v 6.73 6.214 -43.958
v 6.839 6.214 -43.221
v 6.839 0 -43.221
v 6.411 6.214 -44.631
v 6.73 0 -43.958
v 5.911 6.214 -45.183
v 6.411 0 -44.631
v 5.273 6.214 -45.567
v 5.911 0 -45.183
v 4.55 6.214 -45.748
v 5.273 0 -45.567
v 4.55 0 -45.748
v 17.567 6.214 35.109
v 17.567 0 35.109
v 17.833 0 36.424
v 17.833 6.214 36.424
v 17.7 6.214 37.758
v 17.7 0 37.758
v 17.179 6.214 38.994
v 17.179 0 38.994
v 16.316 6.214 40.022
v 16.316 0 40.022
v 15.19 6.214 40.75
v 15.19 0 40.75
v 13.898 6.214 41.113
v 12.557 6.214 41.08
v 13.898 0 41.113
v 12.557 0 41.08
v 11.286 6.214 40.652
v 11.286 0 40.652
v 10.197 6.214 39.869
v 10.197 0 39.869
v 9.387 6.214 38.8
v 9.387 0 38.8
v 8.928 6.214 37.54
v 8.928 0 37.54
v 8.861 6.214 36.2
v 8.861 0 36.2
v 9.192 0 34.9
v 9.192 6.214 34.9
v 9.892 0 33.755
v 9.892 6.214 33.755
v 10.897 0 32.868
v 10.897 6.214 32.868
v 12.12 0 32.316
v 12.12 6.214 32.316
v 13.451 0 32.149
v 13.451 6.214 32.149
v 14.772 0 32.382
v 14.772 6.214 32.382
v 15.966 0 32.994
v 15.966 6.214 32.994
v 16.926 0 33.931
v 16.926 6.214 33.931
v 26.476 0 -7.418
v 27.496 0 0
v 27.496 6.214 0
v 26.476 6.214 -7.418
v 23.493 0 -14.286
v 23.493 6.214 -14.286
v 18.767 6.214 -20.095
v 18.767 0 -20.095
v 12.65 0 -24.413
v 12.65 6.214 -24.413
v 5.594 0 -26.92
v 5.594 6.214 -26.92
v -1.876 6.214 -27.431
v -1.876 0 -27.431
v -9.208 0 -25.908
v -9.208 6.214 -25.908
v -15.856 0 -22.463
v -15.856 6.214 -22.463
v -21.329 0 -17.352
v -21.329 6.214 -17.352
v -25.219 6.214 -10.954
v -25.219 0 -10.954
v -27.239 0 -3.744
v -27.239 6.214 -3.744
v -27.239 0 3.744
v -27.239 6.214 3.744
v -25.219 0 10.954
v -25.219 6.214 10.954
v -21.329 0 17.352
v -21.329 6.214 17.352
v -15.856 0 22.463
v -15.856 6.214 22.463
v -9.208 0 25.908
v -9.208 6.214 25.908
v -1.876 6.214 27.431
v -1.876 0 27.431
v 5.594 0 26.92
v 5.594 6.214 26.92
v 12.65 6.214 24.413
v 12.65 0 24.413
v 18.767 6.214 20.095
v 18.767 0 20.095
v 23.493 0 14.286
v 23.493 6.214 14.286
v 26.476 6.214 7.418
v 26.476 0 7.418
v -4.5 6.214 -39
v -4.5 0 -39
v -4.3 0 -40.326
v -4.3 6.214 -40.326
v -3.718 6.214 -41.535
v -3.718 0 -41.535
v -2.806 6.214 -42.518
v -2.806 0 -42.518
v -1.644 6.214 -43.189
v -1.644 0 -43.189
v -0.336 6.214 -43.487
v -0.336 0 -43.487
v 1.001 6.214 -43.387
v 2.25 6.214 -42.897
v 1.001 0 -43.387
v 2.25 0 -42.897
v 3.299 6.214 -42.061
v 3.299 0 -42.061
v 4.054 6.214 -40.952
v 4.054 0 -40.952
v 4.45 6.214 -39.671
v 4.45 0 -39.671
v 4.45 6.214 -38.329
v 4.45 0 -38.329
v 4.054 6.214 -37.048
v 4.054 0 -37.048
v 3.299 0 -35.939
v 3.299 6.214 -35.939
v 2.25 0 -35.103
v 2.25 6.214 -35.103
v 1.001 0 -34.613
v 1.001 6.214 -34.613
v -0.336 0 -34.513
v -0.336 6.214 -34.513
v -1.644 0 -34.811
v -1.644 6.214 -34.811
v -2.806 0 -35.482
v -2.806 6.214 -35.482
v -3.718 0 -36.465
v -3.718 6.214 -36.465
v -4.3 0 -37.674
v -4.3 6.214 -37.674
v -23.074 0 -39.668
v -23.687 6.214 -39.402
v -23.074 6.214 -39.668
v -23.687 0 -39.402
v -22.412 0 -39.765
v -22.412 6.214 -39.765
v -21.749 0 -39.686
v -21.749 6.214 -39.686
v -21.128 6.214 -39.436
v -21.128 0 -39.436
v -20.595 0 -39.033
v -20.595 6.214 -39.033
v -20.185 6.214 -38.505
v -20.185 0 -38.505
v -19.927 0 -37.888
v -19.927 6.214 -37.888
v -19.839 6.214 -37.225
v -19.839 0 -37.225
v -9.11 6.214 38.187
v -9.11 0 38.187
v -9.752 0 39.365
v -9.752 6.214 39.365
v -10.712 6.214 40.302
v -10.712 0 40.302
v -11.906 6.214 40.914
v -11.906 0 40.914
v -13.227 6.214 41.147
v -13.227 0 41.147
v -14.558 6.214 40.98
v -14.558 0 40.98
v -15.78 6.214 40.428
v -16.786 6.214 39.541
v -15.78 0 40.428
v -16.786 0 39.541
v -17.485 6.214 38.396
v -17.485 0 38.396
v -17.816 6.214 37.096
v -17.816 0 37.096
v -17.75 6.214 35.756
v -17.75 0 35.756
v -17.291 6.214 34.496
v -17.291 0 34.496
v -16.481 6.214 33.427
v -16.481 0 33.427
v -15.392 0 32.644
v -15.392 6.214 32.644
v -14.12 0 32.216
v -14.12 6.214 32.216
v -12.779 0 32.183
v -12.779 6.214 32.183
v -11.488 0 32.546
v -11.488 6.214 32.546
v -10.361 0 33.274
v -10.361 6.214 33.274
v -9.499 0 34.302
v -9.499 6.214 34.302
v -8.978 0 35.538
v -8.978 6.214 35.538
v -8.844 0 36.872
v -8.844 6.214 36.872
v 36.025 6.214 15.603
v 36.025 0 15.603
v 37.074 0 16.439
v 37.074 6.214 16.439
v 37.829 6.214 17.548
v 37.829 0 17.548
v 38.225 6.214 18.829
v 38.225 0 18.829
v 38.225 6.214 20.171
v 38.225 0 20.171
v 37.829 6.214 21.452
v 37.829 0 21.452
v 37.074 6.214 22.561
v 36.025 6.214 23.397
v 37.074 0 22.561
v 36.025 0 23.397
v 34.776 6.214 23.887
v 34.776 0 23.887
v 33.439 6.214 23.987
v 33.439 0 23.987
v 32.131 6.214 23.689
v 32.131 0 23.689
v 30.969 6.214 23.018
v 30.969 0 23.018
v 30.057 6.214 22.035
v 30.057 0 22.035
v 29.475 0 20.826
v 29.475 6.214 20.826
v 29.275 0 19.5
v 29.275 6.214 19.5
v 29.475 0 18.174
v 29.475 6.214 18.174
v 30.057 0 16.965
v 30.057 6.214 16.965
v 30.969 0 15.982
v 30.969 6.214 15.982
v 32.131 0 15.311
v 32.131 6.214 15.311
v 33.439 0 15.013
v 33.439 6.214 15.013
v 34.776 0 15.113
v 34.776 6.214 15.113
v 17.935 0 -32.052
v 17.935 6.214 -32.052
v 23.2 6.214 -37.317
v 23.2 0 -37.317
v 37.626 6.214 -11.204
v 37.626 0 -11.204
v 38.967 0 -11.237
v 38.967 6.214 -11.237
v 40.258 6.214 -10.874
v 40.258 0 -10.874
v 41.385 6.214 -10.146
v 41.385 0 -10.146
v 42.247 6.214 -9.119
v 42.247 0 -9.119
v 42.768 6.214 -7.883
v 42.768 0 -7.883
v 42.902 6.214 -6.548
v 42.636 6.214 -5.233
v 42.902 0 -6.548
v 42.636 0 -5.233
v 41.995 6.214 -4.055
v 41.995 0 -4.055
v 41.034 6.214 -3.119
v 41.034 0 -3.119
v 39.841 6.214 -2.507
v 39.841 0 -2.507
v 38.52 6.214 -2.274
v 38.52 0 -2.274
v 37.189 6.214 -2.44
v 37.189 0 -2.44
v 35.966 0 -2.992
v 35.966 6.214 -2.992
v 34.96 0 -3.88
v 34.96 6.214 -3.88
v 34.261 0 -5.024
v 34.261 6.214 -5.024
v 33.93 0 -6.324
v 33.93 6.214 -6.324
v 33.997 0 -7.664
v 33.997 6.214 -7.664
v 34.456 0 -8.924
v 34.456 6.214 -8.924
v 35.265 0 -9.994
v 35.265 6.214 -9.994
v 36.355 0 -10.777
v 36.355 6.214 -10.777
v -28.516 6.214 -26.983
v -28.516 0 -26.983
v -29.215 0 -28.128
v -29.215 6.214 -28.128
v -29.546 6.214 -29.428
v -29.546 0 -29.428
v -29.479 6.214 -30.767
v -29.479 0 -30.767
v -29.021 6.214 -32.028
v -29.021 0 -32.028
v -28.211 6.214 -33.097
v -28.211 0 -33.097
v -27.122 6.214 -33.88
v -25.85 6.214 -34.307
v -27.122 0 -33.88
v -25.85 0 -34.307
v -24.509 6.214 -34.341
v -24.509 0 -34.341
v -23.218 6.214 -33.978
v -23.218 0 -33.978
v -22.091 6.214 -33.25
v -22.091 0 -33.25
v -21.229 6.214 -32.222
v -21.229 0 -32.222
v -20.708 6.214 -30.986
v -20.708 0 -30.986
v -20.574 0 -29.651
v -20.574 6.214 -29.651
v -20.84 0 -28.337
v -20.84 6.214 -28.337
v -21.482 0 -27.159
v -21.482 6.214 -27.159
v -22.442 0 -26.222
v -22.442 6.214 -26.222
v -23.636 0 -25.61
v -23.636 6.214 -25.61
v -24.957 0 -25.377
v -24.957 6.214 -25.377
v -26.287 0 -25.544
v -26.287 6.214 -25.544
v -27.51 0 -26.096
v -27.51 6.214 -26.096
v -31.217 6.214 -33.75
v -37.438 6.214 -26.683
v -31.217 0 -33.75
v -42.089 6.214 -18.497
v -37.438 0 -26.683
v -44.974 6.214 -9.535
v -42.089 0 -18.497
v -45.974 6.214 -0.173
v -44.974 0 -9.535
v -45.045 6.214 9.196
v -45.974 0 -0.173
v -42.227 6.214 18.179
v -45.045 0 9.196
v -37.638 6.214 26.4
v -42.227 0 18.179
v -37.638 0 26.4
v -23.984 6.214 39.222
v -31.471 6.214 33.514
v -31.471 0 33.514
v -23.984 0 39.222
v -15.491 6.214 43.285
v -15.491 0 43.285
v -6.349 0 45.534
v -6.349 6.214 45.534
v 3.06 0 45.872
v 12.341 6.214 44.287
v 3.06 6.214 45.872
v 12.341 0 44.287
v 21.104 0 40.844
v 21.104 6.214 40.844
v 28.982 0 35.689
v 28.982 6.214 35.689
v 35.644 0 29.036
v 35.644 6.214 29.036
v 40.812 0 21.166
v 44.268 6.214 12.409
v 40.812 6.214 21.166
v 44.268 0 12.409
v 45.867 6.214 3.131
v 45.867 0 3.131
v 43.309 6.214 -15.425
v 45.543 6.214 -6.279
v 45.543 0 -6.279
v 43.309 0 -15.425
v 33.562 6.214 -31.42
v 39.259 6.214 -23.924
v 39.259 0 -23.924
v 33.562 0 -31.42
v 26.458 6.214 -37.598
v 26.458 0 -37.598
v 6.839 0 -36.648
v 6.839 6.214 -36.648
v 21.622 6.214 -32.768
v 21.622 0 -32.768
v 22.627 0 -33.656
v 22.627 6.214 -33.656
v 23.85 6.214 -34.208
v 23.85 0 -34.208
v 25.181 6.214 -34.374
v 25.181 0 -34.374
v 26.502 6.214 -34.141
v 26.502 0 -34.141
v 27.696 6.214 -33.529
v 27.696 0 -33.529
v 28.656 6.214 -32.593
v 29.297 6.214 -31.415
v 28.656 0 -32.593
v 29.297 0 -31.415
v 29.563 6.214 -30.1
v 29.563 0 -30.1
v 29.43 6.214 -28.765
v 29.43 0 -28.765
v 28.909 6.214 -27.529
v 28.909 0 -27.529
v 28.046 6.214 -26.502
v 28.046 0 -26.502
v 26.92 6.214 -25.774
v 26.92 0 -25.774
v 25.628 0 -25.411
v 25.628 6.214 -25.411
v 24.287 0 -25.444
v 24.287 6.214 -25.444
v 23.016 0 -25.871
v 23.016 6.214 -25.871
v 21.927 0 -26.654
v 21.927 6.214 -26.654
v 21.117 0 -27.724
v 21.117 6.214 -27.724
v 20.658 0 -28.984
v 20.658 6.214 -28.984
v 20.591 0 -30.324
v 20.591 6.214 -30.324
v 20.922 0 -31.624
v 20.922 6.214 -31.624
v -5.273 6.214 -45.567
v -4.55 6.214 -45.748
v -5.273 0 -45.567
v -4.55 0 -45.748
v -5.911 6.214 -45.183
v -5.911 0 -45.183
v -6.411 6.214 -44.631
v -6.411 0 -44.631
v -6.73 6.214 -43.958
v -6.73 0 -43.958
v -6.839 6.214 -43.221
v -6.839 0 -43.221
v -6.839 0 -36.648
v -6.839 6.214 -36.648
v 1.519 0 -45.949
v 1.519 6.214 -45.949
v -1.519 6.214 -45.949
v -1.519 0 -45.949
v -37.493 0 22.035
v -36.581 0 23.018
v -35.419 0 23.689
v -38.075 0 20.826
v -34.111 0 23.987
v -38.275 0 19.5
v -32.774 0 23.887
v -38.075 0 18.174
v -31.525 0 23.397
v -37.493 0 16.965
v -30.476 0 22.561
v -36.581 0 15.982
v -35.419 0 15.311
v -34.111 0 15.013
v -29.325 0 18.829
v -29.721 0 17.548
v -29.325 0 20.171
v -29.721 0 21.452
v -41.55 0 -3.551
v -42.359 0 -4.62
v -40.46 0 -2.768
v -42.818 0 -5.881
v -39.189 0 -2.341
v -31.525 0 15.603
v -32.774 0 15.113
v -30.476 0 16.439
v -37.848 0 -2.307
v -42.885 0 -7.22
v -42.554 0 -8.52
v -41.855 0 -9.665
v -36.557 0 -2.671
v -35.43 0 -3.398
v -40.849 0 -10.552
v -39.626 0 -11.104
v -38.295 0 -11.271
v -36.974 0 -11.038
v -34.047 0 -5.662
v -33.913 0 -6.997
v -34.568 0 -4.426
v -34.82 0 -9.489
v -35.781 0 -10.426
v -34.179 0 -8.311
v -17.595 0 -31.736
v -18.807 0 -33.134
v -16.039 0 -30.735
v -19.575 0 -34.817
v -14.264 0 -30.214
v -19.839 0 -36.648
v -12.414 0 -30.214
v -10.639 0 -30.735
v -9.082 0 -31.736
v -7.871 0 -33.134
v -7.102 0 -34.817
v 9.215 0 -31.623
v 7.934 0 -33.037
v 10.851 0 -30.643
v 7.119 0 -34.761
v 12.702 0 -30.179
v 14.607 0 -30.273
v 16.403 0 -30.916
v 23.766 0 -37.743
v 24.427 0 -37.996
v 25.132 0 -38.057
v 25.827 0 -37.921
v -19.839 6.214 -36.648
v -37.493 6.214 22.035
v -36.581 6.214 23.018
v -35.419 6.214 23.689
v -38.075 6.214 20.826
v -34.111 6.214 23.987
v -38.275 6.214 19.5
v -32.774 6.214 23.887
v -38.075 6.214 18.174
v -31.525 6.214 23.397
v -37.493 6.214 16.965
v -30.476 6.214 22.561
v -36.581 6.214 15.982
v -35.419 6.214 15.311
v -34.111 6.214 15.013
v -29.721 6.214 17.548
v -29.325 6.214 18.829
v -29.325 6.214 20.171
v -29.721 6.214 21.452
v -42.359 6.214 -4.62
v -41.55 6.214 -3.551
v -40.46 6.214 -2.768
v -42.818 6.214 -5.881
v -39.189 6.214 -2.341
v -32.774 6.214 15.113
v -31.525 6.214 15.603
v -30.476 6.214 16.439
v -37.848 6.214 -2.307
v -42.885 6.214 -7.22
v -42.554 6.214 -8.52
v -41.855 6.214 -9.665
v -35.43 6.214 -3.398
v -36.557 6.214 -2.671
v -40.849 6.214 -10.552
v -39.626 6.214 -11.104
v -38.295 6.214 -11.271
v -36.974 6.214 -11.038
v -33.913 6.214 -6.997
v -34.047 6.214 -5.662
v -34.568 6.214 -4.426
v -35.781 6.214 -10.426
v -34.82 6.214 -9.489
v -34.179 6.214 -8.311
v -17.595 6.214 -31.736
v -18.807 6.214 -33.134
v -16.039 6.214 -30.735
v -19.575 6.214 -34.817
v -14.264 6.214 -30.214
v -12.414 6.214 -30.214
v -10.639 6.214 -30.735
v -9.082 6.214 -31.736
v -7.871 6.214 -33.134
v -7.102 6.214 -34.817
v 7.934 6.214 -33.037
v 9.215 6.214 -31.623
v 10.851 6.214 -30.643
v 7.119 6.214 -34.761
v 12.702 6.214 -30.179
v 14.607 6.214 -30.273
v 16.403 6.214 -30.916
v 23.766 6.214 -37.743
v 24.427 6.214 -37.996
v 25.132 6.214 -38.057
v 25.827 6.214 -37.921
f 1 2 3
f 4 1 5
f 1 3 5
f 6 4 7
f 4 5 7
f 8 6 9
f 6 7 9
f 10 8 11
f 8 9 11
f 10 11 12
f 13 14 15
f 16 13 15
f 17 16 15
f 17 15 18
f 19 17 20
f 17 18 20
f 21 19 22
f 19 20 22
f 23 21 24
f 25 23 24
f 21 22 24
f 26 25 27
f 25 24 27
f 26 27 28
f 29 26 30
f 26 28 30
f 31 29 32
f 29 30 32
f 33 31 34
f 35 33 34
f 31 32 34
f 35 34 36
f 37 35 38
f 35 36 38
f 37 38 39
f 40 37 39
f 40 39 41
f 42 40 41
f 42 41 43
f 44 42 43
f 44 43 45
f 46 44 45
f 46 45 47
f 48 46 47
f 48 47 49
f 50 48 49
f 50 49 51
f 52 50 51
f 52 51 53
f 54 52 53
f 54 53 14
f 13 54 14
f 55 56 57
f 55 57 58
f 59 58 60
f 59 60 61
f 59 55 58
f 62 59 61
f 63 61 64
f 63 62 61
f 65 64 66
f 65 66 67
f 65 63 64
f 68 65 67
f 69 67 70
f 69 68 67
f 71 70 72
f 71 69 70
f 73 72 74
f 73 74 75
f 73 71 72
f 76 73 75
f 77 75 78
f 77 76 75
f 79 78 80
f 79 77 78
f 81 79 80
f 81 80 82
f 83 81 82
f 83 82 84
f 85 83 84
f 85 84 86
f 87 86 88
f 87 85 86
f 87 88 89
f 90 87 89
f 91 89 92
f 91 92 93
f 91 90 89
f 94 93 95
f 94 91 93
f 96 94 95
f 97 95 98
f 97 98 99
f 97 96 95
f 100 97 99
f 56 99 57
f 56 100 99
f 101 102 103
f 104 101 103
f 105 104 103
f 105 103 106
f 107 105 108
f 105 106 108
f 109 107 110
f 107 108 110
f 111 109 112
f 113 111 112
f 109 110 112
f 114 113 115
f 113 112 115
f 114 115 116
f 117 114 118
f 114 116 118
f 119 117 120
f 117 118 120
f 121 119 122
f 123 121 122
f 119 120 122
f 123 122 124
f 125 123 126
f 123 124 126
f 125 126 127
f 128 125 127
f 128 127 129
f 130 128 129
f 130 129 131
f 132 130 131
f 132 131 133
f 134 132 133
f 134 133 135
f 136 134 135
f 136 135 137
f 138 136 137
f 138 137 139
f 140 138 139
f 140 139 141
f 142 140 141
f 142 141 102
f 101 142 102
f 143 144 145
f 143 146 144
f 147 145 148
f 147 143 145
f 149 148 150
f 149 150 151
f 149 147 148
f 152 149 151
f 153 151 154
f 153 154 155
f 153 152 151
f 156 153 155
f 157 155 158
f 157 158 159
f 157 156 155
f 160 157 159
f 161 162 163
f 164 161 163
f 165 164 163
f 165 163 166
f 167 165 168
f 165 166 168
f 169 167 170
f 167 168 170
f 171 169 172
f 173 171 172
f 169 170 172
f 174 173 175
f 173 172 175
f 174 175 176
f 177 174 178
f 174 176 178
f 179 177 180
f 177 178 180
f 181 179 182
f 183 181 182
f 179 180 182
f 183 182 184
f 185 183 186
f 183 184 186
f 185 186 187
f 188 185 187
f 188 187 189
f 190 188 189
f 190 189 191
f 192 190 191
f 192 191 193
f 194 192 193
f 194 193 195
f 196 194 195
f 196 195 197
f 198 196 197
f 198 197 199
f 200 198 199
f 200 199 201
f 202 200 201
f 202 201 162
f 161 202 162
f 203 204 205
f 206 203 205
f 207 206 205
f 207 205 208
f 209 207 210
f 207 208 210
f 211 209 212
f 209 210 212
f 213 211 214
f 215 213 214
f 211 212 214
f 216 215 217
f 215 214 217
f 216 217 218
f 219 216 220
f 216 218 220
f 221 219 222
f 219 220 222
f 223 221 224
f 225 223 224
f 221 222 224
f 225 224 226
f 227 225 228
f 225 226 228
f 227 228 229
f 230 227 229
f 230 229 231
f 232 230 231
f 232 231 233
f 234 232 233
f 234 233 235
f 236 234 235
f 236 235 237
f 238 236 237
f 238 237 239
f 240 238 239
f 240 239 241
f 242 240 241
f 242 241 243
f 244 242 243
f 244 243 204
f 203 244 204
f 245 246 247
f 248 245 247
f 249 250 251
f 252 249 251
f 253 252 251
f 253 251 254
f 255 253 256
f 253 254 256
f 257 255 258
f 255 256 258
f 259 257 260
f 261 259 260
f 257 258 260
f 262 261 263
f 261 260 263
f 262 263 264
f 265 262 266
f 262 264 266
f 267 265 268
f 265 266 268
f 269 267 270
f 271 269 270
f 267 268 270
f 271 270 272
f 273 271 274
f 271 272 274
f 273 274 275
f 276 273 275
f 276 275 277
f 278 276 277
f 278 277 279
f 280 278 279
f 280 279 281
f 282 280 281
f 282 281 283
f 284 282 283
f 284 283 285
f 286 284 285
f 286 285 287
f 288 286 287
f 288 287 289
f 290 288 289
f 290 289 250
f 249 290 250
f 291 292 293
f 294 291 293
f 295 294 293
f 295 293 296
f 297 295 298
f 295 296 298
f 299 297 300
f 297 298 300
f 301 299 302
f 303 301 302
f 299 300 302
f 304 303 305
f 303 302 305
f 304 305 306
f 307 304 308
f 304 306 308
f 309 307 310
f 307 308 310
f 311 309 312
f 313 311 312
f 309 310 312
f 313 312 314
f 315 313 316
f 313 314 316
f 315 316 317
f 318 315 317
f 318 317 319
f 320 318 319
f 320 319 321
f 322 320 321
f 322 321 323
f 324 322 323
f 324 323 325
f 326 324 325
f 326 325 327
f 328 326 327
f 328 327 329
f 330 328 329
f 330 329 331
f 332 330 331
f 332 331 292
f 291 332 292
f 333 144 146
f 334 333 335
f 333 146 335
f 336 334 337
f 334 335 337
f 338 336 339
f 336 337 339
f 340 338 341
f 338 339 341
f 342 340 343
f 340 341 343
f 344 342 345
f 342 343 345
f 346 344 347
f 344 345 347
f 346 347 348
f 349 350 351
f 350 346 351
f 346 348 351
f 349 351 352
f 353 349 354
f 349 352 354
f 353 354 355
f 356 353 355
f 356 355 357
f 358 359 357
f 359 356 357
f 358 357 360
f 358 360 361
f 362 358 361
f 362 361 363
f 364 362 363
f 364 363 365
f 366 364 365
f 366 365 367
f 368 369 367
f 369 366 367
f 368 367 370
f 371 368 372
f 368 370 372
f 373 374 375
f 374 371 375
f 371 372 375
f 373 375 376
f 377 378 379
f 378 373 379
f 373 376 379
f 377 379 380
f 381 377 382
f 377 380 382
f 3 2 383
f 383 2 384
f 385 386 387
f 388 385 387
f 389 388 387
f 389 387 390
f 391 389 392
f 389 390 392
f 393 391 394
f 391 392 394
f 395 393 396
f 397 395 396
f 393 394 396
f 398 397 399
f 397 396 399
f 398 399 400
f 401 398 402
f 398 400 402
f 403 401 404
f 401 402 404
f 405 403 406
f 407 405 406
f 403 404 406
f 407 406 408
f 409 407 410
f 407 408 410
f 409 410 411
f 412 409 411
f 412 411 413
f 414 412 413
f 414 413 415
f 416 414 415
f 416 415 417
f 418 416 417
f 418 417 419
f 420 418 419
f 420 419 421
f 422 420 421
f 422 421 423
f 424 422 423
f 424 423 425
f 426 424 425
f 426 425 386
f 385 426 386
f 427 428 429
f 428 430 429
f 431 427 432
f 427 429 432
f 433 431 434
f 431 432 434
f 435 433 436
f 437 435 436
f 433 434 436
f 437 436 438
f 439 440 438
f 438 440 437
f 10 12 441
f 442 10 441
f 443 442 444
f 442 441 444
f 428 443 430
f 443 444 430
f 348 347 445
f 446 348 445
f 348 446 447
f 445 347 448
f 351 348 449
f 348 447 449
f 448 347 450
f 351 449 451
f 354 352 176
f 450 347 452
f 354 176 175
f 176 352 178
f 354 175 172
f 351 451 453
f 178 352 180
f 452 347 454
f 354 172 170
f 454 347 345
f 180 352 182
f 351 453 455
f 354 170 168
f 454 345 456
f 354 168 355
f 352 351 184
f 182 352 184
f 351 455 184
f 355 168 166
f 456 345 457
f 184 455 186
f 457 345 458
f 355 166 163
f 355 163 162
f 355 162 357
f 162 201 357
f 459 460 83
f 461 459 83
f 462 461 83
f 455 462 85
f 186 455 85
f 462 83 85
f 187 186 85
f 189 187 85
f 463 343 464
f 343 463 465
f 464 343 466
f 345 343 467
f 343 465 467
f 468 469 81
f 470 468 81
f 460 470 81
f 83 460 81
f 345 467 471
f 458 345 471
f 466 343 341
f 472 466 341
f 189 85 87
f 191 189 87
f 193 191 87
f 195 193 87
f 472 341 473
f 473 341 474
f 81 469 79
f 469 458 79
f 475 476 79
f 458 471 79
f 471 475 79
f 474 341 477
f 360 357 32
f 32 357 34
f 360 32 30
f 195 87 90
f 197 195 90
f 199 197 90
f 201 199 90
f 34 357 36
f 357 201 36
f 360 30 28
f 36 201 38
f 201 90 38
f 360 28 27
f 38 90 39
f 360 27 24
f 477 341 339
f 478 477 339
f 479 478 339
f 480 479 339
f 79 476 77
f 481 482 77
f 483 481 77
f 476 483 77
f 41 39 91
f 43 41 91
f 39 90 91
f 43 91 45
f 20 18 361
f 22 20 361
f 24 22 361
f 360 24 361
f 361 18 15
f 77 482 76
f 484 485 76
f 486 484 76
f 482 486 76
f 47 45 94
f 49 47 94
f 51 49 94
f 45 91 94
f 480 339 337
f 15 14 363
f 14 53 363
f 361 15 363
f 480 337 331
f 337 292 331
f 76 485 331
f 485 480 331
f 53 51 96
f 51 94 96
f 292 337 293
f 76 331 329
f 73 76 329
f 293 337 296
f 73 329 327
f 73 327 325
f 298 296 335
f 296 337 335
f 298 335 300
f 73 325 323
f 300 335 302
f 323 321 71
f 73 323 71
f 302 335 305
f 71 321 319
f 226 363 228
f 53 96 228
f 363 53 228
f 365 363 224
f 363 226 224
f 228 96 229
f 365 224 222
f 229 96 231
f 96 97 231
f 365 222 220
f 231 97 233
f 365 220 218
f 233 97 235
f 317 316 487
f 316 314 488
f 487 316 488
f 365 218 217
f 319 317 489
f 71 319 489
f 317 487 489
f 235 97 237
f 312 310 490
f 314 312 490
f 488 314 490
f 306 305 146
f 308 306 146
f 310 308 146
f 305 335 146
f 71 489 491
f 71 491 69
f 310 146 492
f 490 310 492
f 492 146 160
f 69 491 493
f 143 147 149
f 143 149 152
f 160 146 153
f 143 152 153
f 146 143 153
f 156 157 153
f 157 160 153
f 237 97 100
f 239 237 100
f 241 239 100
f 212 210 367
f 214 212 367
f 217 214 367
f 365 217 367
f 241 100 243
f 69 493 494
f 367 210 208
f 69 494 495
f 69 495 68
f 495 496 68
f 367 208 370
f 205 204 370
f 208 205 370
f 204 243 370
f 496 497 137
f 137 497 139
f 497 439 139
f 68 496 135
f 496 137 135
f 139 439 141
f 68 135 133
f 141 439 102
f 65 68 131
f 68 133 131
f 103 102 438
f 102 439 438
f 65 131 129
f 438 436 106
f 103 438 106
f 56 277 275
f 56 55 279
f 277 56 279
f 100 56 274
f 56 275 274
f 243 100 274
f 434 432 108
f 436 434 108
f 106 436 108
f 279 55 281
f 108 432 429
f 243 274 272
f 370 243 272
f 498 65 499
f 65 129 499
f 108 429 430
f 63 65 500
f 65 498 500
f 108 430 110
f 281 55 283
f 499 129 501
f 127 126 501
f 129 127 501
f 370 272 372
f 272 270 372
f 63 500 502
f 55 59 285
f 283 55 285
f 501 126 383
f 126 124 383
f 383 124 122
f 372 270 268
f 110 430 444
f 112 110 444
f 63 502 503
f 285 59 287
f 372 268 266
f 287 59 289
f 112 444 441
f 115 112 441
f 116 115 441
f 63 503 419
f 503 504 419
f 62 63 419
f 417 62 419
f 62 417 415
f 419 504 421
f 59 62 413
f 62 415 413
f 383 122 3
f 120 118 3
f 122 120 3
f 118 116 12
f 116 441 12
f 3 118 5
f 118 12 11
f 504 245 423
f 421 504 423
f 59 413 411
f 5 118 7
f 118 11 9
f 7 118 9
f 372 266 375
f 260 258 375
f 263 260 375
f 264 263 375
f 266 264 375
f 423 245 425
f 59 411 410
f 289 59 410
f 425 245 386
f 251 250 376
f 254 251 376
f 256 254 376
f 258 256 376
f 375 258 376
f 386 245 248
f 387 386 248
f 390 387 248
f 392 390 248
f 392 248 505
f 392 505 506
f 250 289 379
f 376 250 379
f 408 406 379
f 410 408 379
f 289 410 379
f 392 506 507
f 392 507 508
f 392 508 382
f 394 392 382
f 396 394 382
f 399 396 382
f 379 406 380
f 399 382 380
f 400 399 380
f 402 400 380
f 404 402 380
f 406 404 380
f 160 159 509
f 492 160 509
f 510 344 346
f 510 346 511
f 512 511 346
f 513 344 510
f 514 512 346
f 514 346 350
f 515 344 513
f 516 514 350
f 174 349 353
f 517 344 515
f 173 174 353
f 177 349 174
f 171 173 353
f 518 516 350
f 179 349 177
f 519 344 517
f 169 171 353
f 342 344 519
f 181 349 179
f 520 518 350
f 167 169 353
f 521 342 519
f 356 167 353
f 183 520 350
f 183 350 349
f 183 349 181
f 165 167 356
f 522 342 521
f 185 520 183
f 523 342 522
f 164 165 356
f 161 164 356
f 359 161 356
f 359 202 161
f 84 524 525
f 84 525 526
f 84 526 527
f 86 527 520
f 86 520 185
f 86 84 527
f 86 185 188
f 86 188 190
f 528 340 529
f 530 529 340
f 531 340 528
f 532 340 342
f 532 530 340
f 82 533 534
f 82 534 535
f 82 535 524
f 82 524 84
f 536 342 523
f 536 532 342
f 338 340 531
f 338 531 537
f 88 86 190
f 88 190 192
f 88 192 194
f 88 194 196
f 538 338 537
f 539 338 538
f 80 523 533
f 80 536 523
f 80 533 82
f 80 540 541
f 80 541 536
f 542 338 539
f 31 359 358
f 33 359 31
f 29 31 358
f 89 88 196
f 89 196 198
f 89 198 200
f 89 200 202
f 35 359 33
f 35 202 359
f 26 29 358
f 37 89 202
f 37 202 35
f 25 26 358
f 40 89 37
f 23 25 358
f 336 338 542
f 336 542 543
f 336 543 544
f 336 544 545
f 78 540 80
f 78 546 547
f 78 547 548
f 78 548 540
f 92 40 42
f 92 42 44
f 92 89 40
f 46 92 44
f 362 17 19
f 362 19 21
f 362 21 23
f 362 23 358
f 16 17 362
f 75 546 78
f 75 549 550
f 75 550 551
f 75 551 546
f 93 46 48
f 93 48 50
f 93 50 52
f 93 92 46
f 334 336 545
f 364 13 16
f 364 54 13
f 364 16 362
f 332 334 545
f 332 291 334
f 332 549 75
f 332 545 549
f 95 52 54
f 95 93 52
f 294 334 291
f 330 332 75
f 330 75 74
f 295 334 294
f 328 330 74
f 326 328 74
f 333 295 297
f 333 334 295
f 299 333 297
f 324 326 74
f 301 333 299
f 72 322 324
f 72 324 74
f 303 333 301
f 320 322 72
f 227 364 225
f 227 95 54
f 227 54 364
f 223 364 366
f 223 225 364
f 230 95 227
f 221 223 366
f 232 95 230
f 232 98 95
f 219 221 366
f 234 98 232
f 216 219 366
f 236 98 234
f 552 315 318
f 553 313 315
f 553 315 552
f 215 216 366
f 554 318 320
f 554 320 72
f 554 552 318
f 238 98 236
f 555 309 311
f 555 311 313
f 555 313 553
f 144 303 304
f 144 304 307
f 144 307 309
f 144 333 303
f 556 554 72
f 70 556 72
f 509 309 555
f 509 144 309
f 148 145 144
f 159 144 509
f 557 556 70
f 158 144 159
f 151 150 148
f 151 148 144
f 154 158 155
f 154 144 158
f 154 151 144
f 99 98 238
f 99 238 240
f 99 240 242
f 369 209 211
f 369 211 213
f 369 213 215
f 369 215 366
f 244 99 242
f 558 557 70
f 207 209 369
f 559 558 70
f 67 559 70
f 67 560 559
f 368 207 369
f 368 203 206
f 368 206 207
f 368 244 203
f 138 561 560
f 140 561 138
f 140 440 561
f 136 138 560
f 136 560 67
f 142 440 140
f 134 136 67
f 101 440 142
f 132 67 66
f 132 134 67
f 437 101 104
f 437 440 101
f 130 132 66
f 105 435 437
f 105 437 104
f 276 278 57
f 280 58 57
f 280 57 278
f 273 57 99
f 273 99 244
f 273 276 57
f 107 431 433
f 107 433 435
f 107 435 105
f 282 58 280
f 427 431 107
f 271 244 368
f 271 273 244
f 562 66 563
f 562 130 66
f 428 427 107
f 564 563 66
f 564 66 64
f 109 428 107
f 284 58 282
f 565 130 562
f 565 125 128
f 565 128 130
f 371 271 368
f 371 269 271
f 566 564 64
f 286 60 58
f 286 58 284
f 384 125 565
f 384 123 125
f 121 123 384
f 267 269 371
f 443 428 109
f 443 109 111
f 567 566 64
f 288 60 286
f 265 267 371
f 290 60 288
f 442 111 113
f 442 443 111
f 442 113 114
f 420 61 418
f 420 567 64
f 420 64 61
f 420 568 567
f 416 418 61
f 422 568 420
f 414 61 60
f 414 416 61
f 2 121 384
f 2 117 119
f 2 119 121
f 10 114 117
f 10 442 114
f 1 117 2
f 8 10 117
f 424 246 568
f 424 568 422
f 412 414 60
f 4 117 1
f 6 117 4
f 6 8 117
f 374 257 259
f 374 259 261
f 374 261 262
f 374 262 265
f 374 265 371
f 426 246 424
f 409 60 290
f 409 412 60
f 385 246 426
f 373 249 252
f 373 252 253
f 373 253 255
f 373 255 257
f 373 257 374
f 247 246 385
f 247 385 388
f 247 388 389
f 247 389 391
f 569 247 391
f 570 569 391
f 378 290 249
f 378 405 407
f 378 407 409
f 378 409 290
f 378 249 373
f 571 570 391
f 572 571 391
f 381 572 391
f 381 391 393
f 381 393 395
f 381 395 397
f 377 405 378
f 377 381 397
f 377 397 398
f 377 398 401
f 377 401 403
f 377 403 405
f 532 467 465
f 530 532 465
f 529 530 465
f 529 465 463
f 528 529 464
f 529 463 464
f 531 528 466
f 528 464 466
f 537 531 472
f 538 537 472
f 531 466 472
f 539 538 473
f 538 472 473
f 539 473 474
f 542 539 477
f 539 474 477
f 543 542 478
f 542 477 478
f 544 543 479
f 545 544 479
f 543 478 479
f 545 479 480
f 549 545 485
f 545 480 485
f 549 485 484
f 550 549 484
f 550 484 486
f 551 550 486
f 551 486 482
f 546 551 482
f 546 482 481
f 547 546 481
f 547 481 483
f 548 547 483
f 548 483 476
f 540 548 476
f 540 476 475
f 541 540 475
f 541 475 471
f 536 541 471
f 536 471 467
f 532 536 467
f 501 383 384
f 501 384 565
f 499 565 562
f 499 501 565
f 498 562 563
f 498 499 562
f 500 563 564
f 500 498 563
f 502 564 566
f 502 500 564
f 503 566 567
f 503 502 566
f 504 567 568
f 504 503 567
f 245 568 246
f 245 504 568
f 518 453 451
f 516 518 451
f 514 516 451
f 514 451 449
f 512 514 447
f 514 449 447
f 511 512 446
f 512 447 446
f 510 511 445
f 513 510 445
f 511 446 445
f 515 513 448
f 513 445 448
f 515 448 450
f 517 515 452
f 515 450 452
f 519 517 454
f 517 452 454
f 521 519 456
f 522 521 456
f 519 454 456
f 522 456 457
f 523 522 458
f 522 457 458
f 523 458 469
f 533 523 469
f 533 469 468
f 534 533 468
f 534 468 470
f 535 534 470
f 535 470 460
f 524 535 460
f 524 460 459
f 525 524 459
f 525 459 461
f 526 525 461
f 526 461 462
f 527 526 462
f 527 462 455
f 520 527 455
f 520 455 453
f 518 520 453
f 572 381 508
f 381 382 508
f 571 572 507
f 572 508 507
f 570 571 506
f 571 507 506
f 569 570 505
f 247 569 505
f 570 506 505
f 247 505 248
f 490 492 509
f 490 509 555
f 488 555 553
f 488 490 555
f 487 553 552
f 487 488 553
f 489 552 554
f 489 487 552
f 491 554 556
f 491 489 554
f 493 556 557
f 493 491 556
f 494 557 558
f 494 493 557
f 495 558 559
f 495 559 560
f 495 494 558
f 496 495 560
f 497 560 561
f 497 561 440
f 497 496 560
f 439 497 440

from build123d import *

# Parameters (mm, degrees)
SKETCH1_R            = 45.974
SKETCH1_R_2          = 27.4955
SKETCH1_R_3          = 6.5
BOSS_EXTRUDE1_DEPTH  = 6.21400078
M8_CLEARANCE_HOLE1_D = 9
CIRPATTERN1_COUNT    = 9
CUT_EXTRUDE1_DEPTH   = 7.21400078
FILLET1_R            = 2.54


with BuildPart() as part:
    # Sketch1 → Boss-Extrude1 (new body)
    with BuildSketch(Plane(origin=(0, 0, 0), x_dir=(1, 0, 0), z_dir=(0, 1, 0))):
        Circle(SKETCH1_R)
        Circle(SKETCH1_R_2, mode=Mode.SUBTRACT)
        with Locations((-13.33878559, 36.648012211)):
            Circle(SKETCH1_R_3, mode=Mode.SUBTRACT)
        with Locations((13.33878559, 36.648012211)):
            Circle(SKETCH1_R_3, mode=Mode.SUBTRACT)
    extrude(amount=BOSS_EXTRUDE1_DEPTH)

    # M8 Clearance Hole1 (through all)
    with Locations(Plane(origin=(0, 6.21400078, 0), x_dir=(1, 0, 0), z_dir=(0, 1, 0))):
        with Locations((0, 39)):
            m8_clearance_hole1 = Hole(M8_CLEARANCE_HOLE1_D / 2)

    # CirPattern1: M8 Clearance Hole1 ×9 about axis
    cirpattern1_axis = Axis((0, 0, 0), (0, 1, 0))
    for i in range(1, CIRPATTERN1_COUNT):
        add(m8_clearance_hole1.rotate(cirpattern1_axis, i * 360 / CIRPATTERN1_COUNT), mode=Mode.SUBTRACT)

    # Sketch6 → Cut-Extrude1 (cut, through all)
    with BuildSketch(Plane(origin=(0, 6.21400078, 0), x_dir=(1, 0, 0), z_dir=(0, 1, 0))):
        with BuildLine():
            Line((17.934979667, 32.051818133), (24.674577095, 38.79141556))
            ThreePointArc((24.674577095, 38.79141556), (16.105864692, 43.06053644), (6.83878559, 45.462508594))
            Line((6.83878559, 45.462508594), (6.83878559, 36.648012211))
            ThreePointArc((6.83878559, 36.648012211), (15.8262279, 42.653229172), (17.934979667, 32.051818133))
        make_face()
        with BuildLine():
            Line((-6.83878559, 36.648012211), (-6.83878559, 45.462508594))
            ThreePointArc((-6.83878559, 45.462508594), (-13.487094864, 43.951188245), (-19.83878559, 41.473259606))
            Line((-19.83878559, 41.473259606), (-19.83878559, 36.648012211))
            ThreePointArc((-19.83878559, 36.648012211), (-13.33878559, 43.148012211), (-6.83878559, 36.648012211))
        make_face()
    extrude(amount=-CUT_EXTRUDE1_DEPTH, mode=Mode.SUBTRACT)

    # Fillet1
    fillet1_edges = [part.edges().sort_by_distance(p)[0] for p in [
        (6.83878559, 3.10700039, -45.462508594),
        (24.674577095, 3.10700039, -38.79141556),
        (-19.83878559, 3.10700039, -41.473259606),
        (-6.83878559, 3.10700039, -45.462508594),
    ]]
    fillet(fillet1_edges, radius=FILLET1_R)


solid = part.part
